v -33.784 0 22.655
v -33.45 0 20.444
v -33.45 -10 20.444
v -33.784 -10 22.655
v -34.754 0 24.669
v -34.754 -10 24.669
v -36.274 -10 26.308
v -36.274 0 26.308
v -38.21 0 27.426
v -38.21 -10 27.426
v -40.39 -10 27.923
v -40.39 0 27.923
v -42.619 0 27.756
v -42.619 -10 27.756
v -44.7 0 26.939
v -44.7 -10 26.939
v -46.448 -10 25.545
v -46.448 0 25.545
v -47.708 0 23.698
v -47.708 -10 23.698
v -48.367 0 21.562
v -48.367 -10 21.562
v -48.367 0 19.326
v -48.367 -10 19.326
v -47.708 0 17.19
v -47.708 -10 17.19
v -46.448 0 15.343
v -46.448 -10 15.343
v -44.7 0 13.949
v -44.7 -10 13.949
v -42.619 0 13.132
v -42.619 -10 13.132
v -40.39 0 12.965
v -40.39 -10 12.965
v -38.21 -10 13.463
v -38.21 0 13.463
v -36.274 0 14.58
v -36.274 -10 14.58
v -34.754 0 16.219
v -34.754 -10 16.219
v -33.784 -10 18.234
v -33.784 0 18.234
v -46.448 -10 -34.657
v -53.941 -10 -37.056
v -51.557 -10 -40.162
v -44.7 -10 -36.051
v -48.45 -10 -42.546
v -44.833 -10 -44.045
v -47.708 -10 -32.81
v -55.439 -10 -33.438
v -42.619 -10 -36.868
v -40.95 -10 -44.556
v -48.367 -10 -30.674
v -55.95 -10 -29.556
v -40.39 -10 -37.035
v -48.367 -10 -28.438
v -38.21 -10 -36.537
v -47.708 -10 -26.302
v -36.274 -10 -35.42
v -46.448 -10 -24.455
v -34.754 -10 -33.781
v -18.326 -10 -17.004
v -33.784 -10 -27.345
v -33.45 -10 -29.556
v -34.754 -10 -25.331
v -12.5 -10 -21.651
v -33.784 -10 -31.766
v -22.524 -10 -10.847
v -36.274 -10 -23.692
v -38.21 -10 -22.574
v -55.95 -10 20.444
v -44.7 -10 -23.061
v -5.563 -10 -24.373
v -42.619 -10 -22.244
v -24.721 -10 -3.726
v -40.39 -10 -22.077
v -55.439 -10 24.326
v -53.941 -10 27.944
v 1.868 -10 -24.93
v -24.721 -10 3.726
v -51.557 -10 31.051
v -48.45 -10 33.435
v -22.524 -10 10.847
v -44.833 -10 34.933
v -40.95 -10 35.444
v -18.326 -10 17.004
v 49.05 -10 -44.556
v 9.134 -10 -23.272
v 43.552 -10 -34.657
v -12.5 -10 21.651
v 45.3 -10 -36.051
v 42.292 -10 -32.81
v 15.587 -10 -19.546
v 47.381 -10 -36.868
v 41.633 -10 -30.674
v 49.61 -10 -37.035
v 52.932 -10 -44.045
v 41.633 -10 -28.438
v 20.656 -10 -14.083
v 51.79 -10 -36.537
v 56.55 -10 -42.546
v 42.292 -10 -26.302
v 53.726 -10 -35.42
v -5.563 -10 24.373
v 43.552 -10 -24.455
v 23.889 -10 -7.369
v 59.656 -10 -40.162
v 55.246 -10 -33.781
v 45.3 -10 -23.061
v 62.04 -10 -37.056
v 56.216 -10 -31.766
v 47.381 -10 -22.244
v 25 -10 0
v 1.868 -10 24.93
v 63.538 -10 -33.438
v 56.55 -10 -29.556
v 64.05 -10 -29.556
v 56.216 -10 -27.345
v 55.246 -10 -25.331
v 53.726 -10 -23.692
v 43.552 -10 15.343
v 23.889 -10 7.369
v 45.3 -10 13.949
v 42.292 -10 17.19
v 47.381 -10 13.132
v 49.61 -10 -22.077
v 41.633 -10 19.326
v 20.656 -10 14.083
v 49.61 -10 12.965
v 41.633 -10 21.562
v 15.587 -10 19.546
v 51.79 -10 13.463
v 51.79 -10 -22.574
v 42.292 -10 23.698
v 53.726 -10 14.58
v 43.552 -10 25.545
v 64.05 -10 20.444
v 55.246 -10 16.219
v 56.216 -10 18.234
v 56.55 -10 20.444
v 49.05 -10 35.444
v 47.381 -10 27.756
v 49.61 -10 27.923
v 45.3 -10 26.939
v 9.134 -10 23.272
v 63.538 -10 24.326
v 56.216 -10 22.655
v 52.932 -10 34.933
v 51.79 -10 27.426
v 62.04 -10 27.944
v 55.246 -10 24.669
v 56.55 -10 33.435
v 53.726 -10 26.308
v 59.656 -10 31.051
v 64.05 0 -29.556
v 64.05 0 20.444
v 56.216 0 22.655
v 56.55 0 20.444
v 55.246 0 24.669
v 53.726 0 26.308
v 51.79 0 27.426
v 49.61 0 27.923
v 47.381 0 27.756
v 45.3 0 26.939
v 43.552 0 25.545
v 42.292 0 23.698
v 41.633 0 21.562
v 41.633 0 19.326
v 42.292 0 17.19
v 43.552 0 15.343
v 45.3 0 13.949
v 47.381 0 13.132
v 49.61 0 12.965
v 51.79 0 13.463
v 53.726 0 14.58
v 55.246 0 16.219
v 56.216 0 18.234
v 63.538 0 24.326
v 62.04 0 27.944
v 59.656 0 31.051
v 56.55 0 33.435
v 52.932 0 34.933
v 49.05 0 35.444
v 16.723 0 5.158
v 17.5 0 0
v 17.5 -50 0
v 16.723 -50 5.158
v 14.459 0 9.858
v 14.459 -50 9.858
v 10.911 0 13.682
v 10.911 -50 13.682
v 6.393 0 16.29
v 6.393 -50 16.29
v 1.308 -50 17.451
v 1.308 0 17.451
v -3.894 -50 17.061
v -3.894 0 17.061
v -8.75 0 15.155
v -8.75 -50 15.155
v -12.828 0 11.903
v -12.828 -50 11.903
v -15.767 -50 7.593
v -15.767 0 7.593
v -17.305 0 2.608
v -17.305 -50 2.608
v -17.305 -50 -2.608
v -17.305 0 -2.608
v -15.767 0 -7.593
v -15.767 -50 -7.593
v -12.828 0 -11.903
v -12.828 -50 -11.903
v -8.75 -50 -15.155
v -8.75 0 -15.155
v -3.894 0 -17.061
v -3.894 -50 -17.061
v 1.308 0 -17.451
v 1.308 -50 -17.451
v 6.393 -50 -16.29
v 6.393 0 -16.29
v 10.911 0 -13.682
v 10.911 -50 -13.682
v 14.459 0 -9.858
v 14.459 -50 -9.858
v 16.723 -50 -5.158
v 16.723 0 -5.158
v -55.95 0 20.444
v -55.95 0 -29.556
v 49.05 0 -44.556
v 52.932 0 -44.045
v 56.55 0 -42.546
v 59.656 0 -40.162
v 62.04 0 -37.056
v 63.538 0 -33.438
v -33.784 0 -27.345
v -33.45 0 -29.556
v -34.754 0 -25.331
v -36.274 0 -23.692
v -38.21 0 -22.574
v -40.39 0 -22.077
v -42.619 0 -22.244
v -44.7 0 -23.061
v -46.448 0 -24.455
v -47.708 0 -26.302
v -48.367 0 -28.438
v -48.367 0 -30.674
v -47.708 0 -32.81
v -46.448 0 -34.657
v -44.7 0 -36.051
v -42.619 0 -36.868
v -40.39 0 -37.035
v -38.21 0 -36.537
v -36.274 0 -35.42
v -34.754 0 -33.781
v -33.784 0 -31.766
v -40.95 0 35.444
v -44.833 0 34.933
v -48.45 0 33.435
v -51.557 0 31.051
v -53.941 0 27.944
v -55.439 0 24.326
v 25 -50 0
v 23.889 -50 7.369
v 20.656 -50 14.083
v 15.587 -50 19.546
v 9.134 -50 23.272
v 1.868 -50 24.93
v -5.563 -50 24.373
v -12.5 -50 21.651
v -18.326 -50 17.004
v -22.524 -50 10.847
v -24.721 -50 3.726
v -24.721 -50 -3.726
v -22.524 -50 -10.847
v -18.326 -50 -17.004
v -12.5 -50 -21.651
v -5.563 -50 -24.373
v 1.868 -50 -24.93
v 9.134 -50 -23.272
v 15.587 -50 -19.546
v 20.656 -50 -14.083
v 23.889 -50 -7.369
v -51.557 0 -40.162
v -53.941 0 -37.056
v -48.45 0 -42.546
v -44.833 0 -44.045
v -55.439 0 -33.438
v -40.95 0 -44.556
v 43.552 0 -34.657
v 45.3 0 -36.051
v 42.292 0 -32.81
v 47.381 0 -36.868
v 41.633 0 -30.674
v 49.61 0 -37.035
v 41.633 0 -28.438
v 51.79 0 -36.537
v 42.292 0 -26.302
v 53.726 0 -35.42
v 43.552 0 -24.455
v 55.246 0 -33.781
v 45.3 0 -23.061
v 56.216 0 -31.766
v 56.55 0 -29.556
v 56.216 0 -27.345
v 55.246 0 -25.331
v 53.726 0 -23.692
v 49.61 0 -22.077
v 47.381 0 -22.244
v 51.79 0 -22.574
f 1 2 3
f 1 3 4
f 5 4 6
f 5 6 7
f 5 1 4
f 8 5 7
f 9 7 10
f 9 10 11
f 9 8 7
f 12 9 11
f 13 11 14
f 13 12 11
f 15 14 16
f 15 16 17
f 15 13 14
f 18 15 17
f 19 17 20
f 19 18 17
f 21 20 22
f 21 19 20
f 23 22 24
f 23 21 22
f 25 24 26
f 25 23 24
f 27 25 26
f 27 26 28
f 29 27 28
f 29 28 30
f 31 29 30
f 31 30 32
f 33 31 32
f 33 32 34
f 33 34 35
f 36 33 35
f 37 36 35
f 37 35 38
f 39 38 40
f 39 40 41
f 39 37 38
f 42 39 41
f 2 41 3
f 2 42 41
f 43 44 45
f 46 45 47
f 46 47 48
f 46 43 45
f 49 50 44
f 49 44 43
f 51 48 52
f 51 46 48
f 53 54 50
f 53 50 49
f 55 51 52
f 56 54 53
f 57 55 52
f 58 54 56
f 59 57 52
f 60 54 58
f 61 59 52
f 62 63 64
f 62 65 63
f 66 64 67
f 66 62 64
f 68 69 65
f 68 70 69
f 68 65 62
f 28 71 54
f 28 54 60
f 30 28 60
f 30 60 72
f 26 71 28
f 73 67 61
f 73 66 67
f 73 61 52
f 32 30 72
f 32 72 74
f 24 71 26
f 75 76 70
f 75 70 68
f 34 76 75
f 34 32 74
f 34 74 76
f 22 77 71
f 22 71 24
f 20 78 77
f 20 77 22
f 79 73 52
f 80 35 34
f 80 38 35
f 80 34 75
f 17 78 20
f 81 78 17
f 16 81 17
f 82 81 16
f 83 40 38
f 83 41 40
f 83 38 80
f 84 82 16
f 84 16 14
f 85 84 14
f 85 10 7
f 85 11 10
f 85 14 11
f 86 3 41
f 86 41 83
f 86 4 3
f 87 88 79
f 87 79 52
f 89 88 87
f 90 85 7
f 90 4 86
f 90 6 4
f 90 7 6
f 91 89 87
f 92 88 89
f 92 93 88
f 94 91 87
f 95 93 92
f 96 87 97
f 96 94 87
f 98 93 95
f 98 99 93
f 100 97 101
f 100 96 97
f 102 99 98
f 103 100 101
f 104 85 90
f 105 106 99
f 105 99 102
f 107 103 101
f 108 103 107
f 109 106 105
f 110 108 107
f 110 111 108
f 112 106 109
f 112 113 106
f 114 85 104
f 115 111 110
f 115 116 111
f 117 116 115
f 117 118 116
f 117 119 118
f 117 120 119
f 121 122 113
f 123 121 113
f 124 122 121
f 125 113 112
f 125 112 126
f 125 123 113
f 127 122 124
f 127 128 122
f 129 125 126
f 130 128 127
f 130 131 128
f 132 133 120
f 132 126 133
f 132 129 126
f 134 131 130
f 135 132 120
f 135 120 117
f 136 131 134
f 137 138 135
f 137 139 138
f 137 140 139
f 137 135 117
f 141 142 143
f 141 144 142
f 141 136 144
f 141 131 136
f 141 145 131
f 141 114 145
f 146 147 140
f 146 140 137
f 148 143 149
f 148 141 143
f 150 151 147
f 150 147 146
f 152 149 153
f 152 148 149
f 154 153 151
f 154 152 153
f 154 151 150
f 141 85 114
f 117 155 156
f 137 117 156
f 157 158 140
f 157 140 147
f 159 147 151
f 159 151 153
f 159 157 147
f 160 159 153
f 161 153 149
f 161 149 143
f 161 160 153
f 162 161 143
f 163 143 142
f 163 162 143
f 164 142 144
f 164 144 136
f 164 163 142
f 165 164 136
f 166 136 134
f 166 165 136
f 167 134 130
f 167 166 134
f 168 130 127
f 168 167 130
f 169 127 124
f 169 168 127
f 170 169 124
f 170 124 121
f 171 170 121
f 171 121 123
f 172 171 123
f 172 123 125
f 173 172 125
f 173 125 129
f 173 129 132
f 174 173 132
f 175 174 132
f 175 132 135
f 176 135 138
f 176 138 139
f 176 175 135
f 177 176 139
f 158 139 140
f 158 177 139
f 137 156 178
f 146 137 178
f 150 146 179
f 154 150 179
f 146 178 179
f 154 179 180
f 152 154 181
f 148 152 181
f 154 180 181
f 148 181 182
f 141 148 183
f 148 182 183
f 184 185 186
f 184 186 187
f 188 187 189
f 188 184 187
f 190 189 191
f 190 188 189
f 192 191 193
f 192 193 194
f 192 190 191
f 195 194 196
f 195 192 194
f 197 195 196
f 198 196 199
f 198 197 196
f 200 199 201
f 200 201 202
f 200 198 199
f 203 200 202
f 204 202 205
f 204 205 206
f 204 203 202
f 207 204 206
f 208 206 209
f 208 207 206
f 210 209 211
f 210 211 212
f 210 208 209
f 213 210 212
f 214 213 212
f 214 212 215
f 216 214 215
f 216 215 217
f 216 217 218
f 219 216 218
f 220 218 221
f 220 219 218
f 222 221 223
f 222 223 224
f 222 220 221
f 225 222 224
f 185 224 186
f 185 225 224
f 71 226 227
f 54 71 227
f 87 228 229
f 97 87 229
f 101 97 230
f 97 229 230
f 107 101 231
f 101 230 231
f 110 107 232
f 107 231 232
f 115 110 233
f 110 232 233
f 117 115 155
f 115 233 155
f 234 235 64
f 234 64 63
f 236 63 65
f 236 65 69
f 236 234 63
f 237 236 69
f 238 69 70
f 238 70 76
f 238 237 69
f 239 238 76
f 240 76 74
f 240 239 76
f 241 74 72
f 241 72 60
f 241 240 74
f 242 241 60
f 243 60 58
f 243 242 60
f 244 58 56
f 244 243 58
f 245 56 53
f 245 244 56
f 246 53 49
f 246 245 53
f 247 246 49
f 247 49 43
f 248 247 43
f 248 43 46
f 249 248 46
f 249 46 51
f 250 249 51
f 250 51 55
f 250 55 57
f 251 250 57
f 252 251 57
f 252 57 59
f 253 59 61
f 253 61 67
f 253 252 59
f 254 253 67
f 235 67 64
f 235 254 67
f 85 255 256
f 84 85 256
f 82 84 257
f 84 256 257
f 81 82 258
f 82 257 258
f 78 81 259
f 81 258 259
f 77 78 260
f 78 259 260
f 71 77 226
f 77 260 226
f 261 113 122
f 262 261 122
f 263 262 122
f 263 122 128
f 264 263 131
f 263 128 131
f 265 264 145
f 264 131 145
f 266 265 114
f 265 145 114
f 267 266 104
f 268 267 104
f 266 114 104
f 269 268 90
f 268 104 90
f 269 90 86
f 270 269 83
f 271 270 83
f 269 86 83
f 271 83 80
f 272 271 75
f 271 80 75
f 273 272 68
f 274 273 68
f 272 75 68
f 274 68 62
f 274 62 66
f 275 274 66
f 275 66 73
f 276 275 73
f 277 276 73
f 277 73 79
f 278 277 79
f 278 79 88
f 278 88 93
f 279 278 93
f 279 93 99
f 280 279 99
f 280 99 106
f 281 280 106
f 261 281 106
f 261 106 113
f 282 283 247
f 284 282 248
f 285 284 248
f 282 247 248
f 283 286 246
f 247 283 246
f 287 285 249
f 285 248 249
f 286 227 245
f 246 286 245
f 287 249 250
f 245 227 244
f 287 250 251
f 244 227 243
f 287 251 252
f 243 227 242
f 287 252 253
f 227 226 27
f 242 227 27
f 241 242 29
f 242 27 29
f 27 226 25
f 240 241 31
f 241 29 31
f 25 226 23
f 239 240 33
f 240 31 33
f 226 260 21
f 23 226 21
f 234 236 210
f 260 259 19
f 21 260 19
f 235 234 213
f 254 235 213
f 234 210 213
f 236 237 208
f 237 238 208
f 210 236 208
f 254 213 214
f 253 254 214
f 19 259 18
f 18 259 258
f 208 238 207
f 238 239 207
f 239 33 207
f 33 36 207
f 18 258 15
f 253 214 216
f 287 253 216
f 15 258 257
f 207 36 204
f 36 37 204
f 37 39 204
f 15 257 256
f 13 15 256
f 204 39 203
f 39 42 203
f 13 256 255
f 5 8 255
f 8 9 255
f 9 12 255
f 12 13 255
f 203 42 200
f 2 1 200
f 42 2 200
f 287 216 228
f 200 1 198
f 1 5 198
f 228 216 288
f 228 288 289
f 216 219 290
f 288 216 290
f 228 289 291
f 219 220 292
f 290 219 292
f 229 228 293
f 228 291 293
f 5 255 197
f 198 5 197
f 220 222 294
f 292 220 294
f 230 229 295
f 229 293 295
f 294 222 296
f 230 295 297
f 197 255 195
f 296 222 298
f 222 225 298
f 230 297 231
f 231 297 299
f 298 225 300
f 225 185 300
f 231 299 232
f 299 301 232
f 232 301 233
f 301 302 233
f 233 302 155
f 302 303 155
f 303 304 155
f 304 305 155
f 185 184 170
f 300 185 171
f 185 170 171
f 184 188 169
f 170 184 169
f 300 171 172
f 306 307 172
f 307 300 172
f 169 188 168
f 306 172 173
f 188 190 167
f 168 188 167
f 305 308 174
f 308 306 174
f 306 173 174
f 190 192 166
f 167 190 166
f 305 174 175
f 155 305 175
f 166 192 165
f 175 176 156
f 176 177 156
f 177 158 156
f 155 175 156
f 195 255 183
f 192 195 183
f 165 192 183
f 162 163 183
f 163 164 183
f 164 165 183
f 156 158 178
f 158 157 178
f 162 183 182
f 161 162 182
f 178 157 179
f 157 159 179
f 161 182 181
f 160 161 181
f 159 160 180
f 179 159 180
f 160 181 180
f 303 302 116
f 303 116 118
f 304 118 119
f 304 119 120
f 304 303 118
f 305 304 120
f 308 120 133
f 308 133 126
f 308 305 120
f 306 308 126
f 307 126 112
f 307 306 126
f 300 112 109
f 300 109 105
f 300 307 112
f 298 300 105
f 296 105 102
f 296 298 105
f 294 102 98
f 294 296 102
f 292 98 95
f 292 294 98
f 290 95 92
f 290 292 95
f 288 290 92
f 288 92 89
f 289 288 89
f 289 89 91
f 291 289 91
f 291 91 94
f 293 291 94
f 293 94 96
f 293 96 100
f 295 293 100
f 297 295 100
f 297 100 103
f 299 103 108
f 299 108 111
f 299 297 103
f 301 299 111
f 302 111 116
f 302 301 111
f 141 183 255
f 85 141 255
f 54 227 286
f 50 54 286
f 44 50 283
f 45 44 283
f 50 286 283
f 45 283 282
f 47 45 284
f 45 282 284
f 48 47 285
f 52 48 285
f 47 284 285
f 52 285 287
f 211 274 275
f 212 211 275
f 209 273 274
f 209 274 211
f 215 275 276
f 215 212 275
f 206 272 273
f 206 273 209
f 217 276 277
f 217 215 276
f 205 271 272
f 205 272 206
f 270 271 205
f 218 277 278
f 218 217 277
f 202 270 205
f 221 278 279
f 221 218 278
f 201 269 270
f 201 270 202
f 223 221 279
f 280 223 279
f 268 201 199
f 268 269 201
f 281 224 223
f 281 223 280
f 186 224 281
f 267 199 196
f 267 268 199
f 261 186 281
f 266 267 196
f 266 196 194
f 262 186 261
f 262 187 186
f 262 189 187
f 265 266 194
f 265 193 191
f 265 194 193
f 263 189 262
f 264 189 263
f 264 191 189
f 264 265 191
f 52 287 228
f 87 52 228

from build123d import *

# Parameters (mm, degrees)
F0_R     = 25
F0_R_2   = 17.5
F1_DEPTH = 50
F2_DEPTH = 112
F0_R_3   = 7.5
F3_DEPTH = 10


# Not quite as in the source:
# - an extrude ends at something that could not be found from the text; its depth is read off the source's solid


with BuildPart() as f1:
    # F0 (on Front) → F1 (new body)
    with BuildSketch(Plane.XZ):
        Circle(F0_R)
        Circle(F0_R_2, mode=Mode.SUBTRACT)
    extrude(amount=F1_DEPTH)

    # F0 (on Front) → F2 (cut, through all)
    with BuildSketch(Plane.XZ):
        Circle(F0_R_2)
    extrude(amount=-F2_DEPTH, mode=Mode.SUBTRACT)

    # F0 (on Front) → F3 (join)
    with BuildSketch(Plane.XZ):
        with BuildLine():
            Line((49.0495060384, 35.4441977432), (-40.9504939616, 35.4441977432))
            ThreePointArc((-40.9504939616, 35.4441977432), (-51.5570956794, 31.050799461), (-55.9504939616, 20.4441977432))
            Line((-55.9504939616, 20.4441977432), (-55.9504939616, -29.5558022568))
            ThreePointArc((-55.9504939616, -29.5558022568), (-51.5570956794, -40.1624039746), (-40.9504939616, -44.5558022568))
            Line((-40.9504939616, -44.5558022568), (49.0495060384, -44.5558022568))
            ThreePointArc((49.0495060384, -44.5558022568), (59.6561077562, -40.1624039746), (64.0495060384, -29.5558022568))
            Line((64.0495060384, -29.5558022568), (64.0495060384, 20.4441977432))
            ThreePointArc((64.0495060384, 20.4441977432), (59.6561077562, 31.050799461), (49.0495060384, 35.4441977432))
        make_face()
        with Locations((-40.9504939616, -29.5558022568)):
            Circle(F0_R_3, mode=Mode.SUBTRACT)
        with Locations((49.0495060384, -29.5558022568)):
            Circle(F0_R_3, mode=Mode.SUBTRACT)
        Circle(F0_R, mode=Mode.SUBTRACT)
        with Locations((-40.9504939616, 20.4441977432)):
            Circle(F0_R_3, mode=Mode.SUBTRACT)
        with Locations((49.0495060384, 20.4441977432)):
            Circle(F0_R_3, mode=Mode.SUBTRACT)
    extrude(amount=F3_DEPTH)


solid = f1.part
